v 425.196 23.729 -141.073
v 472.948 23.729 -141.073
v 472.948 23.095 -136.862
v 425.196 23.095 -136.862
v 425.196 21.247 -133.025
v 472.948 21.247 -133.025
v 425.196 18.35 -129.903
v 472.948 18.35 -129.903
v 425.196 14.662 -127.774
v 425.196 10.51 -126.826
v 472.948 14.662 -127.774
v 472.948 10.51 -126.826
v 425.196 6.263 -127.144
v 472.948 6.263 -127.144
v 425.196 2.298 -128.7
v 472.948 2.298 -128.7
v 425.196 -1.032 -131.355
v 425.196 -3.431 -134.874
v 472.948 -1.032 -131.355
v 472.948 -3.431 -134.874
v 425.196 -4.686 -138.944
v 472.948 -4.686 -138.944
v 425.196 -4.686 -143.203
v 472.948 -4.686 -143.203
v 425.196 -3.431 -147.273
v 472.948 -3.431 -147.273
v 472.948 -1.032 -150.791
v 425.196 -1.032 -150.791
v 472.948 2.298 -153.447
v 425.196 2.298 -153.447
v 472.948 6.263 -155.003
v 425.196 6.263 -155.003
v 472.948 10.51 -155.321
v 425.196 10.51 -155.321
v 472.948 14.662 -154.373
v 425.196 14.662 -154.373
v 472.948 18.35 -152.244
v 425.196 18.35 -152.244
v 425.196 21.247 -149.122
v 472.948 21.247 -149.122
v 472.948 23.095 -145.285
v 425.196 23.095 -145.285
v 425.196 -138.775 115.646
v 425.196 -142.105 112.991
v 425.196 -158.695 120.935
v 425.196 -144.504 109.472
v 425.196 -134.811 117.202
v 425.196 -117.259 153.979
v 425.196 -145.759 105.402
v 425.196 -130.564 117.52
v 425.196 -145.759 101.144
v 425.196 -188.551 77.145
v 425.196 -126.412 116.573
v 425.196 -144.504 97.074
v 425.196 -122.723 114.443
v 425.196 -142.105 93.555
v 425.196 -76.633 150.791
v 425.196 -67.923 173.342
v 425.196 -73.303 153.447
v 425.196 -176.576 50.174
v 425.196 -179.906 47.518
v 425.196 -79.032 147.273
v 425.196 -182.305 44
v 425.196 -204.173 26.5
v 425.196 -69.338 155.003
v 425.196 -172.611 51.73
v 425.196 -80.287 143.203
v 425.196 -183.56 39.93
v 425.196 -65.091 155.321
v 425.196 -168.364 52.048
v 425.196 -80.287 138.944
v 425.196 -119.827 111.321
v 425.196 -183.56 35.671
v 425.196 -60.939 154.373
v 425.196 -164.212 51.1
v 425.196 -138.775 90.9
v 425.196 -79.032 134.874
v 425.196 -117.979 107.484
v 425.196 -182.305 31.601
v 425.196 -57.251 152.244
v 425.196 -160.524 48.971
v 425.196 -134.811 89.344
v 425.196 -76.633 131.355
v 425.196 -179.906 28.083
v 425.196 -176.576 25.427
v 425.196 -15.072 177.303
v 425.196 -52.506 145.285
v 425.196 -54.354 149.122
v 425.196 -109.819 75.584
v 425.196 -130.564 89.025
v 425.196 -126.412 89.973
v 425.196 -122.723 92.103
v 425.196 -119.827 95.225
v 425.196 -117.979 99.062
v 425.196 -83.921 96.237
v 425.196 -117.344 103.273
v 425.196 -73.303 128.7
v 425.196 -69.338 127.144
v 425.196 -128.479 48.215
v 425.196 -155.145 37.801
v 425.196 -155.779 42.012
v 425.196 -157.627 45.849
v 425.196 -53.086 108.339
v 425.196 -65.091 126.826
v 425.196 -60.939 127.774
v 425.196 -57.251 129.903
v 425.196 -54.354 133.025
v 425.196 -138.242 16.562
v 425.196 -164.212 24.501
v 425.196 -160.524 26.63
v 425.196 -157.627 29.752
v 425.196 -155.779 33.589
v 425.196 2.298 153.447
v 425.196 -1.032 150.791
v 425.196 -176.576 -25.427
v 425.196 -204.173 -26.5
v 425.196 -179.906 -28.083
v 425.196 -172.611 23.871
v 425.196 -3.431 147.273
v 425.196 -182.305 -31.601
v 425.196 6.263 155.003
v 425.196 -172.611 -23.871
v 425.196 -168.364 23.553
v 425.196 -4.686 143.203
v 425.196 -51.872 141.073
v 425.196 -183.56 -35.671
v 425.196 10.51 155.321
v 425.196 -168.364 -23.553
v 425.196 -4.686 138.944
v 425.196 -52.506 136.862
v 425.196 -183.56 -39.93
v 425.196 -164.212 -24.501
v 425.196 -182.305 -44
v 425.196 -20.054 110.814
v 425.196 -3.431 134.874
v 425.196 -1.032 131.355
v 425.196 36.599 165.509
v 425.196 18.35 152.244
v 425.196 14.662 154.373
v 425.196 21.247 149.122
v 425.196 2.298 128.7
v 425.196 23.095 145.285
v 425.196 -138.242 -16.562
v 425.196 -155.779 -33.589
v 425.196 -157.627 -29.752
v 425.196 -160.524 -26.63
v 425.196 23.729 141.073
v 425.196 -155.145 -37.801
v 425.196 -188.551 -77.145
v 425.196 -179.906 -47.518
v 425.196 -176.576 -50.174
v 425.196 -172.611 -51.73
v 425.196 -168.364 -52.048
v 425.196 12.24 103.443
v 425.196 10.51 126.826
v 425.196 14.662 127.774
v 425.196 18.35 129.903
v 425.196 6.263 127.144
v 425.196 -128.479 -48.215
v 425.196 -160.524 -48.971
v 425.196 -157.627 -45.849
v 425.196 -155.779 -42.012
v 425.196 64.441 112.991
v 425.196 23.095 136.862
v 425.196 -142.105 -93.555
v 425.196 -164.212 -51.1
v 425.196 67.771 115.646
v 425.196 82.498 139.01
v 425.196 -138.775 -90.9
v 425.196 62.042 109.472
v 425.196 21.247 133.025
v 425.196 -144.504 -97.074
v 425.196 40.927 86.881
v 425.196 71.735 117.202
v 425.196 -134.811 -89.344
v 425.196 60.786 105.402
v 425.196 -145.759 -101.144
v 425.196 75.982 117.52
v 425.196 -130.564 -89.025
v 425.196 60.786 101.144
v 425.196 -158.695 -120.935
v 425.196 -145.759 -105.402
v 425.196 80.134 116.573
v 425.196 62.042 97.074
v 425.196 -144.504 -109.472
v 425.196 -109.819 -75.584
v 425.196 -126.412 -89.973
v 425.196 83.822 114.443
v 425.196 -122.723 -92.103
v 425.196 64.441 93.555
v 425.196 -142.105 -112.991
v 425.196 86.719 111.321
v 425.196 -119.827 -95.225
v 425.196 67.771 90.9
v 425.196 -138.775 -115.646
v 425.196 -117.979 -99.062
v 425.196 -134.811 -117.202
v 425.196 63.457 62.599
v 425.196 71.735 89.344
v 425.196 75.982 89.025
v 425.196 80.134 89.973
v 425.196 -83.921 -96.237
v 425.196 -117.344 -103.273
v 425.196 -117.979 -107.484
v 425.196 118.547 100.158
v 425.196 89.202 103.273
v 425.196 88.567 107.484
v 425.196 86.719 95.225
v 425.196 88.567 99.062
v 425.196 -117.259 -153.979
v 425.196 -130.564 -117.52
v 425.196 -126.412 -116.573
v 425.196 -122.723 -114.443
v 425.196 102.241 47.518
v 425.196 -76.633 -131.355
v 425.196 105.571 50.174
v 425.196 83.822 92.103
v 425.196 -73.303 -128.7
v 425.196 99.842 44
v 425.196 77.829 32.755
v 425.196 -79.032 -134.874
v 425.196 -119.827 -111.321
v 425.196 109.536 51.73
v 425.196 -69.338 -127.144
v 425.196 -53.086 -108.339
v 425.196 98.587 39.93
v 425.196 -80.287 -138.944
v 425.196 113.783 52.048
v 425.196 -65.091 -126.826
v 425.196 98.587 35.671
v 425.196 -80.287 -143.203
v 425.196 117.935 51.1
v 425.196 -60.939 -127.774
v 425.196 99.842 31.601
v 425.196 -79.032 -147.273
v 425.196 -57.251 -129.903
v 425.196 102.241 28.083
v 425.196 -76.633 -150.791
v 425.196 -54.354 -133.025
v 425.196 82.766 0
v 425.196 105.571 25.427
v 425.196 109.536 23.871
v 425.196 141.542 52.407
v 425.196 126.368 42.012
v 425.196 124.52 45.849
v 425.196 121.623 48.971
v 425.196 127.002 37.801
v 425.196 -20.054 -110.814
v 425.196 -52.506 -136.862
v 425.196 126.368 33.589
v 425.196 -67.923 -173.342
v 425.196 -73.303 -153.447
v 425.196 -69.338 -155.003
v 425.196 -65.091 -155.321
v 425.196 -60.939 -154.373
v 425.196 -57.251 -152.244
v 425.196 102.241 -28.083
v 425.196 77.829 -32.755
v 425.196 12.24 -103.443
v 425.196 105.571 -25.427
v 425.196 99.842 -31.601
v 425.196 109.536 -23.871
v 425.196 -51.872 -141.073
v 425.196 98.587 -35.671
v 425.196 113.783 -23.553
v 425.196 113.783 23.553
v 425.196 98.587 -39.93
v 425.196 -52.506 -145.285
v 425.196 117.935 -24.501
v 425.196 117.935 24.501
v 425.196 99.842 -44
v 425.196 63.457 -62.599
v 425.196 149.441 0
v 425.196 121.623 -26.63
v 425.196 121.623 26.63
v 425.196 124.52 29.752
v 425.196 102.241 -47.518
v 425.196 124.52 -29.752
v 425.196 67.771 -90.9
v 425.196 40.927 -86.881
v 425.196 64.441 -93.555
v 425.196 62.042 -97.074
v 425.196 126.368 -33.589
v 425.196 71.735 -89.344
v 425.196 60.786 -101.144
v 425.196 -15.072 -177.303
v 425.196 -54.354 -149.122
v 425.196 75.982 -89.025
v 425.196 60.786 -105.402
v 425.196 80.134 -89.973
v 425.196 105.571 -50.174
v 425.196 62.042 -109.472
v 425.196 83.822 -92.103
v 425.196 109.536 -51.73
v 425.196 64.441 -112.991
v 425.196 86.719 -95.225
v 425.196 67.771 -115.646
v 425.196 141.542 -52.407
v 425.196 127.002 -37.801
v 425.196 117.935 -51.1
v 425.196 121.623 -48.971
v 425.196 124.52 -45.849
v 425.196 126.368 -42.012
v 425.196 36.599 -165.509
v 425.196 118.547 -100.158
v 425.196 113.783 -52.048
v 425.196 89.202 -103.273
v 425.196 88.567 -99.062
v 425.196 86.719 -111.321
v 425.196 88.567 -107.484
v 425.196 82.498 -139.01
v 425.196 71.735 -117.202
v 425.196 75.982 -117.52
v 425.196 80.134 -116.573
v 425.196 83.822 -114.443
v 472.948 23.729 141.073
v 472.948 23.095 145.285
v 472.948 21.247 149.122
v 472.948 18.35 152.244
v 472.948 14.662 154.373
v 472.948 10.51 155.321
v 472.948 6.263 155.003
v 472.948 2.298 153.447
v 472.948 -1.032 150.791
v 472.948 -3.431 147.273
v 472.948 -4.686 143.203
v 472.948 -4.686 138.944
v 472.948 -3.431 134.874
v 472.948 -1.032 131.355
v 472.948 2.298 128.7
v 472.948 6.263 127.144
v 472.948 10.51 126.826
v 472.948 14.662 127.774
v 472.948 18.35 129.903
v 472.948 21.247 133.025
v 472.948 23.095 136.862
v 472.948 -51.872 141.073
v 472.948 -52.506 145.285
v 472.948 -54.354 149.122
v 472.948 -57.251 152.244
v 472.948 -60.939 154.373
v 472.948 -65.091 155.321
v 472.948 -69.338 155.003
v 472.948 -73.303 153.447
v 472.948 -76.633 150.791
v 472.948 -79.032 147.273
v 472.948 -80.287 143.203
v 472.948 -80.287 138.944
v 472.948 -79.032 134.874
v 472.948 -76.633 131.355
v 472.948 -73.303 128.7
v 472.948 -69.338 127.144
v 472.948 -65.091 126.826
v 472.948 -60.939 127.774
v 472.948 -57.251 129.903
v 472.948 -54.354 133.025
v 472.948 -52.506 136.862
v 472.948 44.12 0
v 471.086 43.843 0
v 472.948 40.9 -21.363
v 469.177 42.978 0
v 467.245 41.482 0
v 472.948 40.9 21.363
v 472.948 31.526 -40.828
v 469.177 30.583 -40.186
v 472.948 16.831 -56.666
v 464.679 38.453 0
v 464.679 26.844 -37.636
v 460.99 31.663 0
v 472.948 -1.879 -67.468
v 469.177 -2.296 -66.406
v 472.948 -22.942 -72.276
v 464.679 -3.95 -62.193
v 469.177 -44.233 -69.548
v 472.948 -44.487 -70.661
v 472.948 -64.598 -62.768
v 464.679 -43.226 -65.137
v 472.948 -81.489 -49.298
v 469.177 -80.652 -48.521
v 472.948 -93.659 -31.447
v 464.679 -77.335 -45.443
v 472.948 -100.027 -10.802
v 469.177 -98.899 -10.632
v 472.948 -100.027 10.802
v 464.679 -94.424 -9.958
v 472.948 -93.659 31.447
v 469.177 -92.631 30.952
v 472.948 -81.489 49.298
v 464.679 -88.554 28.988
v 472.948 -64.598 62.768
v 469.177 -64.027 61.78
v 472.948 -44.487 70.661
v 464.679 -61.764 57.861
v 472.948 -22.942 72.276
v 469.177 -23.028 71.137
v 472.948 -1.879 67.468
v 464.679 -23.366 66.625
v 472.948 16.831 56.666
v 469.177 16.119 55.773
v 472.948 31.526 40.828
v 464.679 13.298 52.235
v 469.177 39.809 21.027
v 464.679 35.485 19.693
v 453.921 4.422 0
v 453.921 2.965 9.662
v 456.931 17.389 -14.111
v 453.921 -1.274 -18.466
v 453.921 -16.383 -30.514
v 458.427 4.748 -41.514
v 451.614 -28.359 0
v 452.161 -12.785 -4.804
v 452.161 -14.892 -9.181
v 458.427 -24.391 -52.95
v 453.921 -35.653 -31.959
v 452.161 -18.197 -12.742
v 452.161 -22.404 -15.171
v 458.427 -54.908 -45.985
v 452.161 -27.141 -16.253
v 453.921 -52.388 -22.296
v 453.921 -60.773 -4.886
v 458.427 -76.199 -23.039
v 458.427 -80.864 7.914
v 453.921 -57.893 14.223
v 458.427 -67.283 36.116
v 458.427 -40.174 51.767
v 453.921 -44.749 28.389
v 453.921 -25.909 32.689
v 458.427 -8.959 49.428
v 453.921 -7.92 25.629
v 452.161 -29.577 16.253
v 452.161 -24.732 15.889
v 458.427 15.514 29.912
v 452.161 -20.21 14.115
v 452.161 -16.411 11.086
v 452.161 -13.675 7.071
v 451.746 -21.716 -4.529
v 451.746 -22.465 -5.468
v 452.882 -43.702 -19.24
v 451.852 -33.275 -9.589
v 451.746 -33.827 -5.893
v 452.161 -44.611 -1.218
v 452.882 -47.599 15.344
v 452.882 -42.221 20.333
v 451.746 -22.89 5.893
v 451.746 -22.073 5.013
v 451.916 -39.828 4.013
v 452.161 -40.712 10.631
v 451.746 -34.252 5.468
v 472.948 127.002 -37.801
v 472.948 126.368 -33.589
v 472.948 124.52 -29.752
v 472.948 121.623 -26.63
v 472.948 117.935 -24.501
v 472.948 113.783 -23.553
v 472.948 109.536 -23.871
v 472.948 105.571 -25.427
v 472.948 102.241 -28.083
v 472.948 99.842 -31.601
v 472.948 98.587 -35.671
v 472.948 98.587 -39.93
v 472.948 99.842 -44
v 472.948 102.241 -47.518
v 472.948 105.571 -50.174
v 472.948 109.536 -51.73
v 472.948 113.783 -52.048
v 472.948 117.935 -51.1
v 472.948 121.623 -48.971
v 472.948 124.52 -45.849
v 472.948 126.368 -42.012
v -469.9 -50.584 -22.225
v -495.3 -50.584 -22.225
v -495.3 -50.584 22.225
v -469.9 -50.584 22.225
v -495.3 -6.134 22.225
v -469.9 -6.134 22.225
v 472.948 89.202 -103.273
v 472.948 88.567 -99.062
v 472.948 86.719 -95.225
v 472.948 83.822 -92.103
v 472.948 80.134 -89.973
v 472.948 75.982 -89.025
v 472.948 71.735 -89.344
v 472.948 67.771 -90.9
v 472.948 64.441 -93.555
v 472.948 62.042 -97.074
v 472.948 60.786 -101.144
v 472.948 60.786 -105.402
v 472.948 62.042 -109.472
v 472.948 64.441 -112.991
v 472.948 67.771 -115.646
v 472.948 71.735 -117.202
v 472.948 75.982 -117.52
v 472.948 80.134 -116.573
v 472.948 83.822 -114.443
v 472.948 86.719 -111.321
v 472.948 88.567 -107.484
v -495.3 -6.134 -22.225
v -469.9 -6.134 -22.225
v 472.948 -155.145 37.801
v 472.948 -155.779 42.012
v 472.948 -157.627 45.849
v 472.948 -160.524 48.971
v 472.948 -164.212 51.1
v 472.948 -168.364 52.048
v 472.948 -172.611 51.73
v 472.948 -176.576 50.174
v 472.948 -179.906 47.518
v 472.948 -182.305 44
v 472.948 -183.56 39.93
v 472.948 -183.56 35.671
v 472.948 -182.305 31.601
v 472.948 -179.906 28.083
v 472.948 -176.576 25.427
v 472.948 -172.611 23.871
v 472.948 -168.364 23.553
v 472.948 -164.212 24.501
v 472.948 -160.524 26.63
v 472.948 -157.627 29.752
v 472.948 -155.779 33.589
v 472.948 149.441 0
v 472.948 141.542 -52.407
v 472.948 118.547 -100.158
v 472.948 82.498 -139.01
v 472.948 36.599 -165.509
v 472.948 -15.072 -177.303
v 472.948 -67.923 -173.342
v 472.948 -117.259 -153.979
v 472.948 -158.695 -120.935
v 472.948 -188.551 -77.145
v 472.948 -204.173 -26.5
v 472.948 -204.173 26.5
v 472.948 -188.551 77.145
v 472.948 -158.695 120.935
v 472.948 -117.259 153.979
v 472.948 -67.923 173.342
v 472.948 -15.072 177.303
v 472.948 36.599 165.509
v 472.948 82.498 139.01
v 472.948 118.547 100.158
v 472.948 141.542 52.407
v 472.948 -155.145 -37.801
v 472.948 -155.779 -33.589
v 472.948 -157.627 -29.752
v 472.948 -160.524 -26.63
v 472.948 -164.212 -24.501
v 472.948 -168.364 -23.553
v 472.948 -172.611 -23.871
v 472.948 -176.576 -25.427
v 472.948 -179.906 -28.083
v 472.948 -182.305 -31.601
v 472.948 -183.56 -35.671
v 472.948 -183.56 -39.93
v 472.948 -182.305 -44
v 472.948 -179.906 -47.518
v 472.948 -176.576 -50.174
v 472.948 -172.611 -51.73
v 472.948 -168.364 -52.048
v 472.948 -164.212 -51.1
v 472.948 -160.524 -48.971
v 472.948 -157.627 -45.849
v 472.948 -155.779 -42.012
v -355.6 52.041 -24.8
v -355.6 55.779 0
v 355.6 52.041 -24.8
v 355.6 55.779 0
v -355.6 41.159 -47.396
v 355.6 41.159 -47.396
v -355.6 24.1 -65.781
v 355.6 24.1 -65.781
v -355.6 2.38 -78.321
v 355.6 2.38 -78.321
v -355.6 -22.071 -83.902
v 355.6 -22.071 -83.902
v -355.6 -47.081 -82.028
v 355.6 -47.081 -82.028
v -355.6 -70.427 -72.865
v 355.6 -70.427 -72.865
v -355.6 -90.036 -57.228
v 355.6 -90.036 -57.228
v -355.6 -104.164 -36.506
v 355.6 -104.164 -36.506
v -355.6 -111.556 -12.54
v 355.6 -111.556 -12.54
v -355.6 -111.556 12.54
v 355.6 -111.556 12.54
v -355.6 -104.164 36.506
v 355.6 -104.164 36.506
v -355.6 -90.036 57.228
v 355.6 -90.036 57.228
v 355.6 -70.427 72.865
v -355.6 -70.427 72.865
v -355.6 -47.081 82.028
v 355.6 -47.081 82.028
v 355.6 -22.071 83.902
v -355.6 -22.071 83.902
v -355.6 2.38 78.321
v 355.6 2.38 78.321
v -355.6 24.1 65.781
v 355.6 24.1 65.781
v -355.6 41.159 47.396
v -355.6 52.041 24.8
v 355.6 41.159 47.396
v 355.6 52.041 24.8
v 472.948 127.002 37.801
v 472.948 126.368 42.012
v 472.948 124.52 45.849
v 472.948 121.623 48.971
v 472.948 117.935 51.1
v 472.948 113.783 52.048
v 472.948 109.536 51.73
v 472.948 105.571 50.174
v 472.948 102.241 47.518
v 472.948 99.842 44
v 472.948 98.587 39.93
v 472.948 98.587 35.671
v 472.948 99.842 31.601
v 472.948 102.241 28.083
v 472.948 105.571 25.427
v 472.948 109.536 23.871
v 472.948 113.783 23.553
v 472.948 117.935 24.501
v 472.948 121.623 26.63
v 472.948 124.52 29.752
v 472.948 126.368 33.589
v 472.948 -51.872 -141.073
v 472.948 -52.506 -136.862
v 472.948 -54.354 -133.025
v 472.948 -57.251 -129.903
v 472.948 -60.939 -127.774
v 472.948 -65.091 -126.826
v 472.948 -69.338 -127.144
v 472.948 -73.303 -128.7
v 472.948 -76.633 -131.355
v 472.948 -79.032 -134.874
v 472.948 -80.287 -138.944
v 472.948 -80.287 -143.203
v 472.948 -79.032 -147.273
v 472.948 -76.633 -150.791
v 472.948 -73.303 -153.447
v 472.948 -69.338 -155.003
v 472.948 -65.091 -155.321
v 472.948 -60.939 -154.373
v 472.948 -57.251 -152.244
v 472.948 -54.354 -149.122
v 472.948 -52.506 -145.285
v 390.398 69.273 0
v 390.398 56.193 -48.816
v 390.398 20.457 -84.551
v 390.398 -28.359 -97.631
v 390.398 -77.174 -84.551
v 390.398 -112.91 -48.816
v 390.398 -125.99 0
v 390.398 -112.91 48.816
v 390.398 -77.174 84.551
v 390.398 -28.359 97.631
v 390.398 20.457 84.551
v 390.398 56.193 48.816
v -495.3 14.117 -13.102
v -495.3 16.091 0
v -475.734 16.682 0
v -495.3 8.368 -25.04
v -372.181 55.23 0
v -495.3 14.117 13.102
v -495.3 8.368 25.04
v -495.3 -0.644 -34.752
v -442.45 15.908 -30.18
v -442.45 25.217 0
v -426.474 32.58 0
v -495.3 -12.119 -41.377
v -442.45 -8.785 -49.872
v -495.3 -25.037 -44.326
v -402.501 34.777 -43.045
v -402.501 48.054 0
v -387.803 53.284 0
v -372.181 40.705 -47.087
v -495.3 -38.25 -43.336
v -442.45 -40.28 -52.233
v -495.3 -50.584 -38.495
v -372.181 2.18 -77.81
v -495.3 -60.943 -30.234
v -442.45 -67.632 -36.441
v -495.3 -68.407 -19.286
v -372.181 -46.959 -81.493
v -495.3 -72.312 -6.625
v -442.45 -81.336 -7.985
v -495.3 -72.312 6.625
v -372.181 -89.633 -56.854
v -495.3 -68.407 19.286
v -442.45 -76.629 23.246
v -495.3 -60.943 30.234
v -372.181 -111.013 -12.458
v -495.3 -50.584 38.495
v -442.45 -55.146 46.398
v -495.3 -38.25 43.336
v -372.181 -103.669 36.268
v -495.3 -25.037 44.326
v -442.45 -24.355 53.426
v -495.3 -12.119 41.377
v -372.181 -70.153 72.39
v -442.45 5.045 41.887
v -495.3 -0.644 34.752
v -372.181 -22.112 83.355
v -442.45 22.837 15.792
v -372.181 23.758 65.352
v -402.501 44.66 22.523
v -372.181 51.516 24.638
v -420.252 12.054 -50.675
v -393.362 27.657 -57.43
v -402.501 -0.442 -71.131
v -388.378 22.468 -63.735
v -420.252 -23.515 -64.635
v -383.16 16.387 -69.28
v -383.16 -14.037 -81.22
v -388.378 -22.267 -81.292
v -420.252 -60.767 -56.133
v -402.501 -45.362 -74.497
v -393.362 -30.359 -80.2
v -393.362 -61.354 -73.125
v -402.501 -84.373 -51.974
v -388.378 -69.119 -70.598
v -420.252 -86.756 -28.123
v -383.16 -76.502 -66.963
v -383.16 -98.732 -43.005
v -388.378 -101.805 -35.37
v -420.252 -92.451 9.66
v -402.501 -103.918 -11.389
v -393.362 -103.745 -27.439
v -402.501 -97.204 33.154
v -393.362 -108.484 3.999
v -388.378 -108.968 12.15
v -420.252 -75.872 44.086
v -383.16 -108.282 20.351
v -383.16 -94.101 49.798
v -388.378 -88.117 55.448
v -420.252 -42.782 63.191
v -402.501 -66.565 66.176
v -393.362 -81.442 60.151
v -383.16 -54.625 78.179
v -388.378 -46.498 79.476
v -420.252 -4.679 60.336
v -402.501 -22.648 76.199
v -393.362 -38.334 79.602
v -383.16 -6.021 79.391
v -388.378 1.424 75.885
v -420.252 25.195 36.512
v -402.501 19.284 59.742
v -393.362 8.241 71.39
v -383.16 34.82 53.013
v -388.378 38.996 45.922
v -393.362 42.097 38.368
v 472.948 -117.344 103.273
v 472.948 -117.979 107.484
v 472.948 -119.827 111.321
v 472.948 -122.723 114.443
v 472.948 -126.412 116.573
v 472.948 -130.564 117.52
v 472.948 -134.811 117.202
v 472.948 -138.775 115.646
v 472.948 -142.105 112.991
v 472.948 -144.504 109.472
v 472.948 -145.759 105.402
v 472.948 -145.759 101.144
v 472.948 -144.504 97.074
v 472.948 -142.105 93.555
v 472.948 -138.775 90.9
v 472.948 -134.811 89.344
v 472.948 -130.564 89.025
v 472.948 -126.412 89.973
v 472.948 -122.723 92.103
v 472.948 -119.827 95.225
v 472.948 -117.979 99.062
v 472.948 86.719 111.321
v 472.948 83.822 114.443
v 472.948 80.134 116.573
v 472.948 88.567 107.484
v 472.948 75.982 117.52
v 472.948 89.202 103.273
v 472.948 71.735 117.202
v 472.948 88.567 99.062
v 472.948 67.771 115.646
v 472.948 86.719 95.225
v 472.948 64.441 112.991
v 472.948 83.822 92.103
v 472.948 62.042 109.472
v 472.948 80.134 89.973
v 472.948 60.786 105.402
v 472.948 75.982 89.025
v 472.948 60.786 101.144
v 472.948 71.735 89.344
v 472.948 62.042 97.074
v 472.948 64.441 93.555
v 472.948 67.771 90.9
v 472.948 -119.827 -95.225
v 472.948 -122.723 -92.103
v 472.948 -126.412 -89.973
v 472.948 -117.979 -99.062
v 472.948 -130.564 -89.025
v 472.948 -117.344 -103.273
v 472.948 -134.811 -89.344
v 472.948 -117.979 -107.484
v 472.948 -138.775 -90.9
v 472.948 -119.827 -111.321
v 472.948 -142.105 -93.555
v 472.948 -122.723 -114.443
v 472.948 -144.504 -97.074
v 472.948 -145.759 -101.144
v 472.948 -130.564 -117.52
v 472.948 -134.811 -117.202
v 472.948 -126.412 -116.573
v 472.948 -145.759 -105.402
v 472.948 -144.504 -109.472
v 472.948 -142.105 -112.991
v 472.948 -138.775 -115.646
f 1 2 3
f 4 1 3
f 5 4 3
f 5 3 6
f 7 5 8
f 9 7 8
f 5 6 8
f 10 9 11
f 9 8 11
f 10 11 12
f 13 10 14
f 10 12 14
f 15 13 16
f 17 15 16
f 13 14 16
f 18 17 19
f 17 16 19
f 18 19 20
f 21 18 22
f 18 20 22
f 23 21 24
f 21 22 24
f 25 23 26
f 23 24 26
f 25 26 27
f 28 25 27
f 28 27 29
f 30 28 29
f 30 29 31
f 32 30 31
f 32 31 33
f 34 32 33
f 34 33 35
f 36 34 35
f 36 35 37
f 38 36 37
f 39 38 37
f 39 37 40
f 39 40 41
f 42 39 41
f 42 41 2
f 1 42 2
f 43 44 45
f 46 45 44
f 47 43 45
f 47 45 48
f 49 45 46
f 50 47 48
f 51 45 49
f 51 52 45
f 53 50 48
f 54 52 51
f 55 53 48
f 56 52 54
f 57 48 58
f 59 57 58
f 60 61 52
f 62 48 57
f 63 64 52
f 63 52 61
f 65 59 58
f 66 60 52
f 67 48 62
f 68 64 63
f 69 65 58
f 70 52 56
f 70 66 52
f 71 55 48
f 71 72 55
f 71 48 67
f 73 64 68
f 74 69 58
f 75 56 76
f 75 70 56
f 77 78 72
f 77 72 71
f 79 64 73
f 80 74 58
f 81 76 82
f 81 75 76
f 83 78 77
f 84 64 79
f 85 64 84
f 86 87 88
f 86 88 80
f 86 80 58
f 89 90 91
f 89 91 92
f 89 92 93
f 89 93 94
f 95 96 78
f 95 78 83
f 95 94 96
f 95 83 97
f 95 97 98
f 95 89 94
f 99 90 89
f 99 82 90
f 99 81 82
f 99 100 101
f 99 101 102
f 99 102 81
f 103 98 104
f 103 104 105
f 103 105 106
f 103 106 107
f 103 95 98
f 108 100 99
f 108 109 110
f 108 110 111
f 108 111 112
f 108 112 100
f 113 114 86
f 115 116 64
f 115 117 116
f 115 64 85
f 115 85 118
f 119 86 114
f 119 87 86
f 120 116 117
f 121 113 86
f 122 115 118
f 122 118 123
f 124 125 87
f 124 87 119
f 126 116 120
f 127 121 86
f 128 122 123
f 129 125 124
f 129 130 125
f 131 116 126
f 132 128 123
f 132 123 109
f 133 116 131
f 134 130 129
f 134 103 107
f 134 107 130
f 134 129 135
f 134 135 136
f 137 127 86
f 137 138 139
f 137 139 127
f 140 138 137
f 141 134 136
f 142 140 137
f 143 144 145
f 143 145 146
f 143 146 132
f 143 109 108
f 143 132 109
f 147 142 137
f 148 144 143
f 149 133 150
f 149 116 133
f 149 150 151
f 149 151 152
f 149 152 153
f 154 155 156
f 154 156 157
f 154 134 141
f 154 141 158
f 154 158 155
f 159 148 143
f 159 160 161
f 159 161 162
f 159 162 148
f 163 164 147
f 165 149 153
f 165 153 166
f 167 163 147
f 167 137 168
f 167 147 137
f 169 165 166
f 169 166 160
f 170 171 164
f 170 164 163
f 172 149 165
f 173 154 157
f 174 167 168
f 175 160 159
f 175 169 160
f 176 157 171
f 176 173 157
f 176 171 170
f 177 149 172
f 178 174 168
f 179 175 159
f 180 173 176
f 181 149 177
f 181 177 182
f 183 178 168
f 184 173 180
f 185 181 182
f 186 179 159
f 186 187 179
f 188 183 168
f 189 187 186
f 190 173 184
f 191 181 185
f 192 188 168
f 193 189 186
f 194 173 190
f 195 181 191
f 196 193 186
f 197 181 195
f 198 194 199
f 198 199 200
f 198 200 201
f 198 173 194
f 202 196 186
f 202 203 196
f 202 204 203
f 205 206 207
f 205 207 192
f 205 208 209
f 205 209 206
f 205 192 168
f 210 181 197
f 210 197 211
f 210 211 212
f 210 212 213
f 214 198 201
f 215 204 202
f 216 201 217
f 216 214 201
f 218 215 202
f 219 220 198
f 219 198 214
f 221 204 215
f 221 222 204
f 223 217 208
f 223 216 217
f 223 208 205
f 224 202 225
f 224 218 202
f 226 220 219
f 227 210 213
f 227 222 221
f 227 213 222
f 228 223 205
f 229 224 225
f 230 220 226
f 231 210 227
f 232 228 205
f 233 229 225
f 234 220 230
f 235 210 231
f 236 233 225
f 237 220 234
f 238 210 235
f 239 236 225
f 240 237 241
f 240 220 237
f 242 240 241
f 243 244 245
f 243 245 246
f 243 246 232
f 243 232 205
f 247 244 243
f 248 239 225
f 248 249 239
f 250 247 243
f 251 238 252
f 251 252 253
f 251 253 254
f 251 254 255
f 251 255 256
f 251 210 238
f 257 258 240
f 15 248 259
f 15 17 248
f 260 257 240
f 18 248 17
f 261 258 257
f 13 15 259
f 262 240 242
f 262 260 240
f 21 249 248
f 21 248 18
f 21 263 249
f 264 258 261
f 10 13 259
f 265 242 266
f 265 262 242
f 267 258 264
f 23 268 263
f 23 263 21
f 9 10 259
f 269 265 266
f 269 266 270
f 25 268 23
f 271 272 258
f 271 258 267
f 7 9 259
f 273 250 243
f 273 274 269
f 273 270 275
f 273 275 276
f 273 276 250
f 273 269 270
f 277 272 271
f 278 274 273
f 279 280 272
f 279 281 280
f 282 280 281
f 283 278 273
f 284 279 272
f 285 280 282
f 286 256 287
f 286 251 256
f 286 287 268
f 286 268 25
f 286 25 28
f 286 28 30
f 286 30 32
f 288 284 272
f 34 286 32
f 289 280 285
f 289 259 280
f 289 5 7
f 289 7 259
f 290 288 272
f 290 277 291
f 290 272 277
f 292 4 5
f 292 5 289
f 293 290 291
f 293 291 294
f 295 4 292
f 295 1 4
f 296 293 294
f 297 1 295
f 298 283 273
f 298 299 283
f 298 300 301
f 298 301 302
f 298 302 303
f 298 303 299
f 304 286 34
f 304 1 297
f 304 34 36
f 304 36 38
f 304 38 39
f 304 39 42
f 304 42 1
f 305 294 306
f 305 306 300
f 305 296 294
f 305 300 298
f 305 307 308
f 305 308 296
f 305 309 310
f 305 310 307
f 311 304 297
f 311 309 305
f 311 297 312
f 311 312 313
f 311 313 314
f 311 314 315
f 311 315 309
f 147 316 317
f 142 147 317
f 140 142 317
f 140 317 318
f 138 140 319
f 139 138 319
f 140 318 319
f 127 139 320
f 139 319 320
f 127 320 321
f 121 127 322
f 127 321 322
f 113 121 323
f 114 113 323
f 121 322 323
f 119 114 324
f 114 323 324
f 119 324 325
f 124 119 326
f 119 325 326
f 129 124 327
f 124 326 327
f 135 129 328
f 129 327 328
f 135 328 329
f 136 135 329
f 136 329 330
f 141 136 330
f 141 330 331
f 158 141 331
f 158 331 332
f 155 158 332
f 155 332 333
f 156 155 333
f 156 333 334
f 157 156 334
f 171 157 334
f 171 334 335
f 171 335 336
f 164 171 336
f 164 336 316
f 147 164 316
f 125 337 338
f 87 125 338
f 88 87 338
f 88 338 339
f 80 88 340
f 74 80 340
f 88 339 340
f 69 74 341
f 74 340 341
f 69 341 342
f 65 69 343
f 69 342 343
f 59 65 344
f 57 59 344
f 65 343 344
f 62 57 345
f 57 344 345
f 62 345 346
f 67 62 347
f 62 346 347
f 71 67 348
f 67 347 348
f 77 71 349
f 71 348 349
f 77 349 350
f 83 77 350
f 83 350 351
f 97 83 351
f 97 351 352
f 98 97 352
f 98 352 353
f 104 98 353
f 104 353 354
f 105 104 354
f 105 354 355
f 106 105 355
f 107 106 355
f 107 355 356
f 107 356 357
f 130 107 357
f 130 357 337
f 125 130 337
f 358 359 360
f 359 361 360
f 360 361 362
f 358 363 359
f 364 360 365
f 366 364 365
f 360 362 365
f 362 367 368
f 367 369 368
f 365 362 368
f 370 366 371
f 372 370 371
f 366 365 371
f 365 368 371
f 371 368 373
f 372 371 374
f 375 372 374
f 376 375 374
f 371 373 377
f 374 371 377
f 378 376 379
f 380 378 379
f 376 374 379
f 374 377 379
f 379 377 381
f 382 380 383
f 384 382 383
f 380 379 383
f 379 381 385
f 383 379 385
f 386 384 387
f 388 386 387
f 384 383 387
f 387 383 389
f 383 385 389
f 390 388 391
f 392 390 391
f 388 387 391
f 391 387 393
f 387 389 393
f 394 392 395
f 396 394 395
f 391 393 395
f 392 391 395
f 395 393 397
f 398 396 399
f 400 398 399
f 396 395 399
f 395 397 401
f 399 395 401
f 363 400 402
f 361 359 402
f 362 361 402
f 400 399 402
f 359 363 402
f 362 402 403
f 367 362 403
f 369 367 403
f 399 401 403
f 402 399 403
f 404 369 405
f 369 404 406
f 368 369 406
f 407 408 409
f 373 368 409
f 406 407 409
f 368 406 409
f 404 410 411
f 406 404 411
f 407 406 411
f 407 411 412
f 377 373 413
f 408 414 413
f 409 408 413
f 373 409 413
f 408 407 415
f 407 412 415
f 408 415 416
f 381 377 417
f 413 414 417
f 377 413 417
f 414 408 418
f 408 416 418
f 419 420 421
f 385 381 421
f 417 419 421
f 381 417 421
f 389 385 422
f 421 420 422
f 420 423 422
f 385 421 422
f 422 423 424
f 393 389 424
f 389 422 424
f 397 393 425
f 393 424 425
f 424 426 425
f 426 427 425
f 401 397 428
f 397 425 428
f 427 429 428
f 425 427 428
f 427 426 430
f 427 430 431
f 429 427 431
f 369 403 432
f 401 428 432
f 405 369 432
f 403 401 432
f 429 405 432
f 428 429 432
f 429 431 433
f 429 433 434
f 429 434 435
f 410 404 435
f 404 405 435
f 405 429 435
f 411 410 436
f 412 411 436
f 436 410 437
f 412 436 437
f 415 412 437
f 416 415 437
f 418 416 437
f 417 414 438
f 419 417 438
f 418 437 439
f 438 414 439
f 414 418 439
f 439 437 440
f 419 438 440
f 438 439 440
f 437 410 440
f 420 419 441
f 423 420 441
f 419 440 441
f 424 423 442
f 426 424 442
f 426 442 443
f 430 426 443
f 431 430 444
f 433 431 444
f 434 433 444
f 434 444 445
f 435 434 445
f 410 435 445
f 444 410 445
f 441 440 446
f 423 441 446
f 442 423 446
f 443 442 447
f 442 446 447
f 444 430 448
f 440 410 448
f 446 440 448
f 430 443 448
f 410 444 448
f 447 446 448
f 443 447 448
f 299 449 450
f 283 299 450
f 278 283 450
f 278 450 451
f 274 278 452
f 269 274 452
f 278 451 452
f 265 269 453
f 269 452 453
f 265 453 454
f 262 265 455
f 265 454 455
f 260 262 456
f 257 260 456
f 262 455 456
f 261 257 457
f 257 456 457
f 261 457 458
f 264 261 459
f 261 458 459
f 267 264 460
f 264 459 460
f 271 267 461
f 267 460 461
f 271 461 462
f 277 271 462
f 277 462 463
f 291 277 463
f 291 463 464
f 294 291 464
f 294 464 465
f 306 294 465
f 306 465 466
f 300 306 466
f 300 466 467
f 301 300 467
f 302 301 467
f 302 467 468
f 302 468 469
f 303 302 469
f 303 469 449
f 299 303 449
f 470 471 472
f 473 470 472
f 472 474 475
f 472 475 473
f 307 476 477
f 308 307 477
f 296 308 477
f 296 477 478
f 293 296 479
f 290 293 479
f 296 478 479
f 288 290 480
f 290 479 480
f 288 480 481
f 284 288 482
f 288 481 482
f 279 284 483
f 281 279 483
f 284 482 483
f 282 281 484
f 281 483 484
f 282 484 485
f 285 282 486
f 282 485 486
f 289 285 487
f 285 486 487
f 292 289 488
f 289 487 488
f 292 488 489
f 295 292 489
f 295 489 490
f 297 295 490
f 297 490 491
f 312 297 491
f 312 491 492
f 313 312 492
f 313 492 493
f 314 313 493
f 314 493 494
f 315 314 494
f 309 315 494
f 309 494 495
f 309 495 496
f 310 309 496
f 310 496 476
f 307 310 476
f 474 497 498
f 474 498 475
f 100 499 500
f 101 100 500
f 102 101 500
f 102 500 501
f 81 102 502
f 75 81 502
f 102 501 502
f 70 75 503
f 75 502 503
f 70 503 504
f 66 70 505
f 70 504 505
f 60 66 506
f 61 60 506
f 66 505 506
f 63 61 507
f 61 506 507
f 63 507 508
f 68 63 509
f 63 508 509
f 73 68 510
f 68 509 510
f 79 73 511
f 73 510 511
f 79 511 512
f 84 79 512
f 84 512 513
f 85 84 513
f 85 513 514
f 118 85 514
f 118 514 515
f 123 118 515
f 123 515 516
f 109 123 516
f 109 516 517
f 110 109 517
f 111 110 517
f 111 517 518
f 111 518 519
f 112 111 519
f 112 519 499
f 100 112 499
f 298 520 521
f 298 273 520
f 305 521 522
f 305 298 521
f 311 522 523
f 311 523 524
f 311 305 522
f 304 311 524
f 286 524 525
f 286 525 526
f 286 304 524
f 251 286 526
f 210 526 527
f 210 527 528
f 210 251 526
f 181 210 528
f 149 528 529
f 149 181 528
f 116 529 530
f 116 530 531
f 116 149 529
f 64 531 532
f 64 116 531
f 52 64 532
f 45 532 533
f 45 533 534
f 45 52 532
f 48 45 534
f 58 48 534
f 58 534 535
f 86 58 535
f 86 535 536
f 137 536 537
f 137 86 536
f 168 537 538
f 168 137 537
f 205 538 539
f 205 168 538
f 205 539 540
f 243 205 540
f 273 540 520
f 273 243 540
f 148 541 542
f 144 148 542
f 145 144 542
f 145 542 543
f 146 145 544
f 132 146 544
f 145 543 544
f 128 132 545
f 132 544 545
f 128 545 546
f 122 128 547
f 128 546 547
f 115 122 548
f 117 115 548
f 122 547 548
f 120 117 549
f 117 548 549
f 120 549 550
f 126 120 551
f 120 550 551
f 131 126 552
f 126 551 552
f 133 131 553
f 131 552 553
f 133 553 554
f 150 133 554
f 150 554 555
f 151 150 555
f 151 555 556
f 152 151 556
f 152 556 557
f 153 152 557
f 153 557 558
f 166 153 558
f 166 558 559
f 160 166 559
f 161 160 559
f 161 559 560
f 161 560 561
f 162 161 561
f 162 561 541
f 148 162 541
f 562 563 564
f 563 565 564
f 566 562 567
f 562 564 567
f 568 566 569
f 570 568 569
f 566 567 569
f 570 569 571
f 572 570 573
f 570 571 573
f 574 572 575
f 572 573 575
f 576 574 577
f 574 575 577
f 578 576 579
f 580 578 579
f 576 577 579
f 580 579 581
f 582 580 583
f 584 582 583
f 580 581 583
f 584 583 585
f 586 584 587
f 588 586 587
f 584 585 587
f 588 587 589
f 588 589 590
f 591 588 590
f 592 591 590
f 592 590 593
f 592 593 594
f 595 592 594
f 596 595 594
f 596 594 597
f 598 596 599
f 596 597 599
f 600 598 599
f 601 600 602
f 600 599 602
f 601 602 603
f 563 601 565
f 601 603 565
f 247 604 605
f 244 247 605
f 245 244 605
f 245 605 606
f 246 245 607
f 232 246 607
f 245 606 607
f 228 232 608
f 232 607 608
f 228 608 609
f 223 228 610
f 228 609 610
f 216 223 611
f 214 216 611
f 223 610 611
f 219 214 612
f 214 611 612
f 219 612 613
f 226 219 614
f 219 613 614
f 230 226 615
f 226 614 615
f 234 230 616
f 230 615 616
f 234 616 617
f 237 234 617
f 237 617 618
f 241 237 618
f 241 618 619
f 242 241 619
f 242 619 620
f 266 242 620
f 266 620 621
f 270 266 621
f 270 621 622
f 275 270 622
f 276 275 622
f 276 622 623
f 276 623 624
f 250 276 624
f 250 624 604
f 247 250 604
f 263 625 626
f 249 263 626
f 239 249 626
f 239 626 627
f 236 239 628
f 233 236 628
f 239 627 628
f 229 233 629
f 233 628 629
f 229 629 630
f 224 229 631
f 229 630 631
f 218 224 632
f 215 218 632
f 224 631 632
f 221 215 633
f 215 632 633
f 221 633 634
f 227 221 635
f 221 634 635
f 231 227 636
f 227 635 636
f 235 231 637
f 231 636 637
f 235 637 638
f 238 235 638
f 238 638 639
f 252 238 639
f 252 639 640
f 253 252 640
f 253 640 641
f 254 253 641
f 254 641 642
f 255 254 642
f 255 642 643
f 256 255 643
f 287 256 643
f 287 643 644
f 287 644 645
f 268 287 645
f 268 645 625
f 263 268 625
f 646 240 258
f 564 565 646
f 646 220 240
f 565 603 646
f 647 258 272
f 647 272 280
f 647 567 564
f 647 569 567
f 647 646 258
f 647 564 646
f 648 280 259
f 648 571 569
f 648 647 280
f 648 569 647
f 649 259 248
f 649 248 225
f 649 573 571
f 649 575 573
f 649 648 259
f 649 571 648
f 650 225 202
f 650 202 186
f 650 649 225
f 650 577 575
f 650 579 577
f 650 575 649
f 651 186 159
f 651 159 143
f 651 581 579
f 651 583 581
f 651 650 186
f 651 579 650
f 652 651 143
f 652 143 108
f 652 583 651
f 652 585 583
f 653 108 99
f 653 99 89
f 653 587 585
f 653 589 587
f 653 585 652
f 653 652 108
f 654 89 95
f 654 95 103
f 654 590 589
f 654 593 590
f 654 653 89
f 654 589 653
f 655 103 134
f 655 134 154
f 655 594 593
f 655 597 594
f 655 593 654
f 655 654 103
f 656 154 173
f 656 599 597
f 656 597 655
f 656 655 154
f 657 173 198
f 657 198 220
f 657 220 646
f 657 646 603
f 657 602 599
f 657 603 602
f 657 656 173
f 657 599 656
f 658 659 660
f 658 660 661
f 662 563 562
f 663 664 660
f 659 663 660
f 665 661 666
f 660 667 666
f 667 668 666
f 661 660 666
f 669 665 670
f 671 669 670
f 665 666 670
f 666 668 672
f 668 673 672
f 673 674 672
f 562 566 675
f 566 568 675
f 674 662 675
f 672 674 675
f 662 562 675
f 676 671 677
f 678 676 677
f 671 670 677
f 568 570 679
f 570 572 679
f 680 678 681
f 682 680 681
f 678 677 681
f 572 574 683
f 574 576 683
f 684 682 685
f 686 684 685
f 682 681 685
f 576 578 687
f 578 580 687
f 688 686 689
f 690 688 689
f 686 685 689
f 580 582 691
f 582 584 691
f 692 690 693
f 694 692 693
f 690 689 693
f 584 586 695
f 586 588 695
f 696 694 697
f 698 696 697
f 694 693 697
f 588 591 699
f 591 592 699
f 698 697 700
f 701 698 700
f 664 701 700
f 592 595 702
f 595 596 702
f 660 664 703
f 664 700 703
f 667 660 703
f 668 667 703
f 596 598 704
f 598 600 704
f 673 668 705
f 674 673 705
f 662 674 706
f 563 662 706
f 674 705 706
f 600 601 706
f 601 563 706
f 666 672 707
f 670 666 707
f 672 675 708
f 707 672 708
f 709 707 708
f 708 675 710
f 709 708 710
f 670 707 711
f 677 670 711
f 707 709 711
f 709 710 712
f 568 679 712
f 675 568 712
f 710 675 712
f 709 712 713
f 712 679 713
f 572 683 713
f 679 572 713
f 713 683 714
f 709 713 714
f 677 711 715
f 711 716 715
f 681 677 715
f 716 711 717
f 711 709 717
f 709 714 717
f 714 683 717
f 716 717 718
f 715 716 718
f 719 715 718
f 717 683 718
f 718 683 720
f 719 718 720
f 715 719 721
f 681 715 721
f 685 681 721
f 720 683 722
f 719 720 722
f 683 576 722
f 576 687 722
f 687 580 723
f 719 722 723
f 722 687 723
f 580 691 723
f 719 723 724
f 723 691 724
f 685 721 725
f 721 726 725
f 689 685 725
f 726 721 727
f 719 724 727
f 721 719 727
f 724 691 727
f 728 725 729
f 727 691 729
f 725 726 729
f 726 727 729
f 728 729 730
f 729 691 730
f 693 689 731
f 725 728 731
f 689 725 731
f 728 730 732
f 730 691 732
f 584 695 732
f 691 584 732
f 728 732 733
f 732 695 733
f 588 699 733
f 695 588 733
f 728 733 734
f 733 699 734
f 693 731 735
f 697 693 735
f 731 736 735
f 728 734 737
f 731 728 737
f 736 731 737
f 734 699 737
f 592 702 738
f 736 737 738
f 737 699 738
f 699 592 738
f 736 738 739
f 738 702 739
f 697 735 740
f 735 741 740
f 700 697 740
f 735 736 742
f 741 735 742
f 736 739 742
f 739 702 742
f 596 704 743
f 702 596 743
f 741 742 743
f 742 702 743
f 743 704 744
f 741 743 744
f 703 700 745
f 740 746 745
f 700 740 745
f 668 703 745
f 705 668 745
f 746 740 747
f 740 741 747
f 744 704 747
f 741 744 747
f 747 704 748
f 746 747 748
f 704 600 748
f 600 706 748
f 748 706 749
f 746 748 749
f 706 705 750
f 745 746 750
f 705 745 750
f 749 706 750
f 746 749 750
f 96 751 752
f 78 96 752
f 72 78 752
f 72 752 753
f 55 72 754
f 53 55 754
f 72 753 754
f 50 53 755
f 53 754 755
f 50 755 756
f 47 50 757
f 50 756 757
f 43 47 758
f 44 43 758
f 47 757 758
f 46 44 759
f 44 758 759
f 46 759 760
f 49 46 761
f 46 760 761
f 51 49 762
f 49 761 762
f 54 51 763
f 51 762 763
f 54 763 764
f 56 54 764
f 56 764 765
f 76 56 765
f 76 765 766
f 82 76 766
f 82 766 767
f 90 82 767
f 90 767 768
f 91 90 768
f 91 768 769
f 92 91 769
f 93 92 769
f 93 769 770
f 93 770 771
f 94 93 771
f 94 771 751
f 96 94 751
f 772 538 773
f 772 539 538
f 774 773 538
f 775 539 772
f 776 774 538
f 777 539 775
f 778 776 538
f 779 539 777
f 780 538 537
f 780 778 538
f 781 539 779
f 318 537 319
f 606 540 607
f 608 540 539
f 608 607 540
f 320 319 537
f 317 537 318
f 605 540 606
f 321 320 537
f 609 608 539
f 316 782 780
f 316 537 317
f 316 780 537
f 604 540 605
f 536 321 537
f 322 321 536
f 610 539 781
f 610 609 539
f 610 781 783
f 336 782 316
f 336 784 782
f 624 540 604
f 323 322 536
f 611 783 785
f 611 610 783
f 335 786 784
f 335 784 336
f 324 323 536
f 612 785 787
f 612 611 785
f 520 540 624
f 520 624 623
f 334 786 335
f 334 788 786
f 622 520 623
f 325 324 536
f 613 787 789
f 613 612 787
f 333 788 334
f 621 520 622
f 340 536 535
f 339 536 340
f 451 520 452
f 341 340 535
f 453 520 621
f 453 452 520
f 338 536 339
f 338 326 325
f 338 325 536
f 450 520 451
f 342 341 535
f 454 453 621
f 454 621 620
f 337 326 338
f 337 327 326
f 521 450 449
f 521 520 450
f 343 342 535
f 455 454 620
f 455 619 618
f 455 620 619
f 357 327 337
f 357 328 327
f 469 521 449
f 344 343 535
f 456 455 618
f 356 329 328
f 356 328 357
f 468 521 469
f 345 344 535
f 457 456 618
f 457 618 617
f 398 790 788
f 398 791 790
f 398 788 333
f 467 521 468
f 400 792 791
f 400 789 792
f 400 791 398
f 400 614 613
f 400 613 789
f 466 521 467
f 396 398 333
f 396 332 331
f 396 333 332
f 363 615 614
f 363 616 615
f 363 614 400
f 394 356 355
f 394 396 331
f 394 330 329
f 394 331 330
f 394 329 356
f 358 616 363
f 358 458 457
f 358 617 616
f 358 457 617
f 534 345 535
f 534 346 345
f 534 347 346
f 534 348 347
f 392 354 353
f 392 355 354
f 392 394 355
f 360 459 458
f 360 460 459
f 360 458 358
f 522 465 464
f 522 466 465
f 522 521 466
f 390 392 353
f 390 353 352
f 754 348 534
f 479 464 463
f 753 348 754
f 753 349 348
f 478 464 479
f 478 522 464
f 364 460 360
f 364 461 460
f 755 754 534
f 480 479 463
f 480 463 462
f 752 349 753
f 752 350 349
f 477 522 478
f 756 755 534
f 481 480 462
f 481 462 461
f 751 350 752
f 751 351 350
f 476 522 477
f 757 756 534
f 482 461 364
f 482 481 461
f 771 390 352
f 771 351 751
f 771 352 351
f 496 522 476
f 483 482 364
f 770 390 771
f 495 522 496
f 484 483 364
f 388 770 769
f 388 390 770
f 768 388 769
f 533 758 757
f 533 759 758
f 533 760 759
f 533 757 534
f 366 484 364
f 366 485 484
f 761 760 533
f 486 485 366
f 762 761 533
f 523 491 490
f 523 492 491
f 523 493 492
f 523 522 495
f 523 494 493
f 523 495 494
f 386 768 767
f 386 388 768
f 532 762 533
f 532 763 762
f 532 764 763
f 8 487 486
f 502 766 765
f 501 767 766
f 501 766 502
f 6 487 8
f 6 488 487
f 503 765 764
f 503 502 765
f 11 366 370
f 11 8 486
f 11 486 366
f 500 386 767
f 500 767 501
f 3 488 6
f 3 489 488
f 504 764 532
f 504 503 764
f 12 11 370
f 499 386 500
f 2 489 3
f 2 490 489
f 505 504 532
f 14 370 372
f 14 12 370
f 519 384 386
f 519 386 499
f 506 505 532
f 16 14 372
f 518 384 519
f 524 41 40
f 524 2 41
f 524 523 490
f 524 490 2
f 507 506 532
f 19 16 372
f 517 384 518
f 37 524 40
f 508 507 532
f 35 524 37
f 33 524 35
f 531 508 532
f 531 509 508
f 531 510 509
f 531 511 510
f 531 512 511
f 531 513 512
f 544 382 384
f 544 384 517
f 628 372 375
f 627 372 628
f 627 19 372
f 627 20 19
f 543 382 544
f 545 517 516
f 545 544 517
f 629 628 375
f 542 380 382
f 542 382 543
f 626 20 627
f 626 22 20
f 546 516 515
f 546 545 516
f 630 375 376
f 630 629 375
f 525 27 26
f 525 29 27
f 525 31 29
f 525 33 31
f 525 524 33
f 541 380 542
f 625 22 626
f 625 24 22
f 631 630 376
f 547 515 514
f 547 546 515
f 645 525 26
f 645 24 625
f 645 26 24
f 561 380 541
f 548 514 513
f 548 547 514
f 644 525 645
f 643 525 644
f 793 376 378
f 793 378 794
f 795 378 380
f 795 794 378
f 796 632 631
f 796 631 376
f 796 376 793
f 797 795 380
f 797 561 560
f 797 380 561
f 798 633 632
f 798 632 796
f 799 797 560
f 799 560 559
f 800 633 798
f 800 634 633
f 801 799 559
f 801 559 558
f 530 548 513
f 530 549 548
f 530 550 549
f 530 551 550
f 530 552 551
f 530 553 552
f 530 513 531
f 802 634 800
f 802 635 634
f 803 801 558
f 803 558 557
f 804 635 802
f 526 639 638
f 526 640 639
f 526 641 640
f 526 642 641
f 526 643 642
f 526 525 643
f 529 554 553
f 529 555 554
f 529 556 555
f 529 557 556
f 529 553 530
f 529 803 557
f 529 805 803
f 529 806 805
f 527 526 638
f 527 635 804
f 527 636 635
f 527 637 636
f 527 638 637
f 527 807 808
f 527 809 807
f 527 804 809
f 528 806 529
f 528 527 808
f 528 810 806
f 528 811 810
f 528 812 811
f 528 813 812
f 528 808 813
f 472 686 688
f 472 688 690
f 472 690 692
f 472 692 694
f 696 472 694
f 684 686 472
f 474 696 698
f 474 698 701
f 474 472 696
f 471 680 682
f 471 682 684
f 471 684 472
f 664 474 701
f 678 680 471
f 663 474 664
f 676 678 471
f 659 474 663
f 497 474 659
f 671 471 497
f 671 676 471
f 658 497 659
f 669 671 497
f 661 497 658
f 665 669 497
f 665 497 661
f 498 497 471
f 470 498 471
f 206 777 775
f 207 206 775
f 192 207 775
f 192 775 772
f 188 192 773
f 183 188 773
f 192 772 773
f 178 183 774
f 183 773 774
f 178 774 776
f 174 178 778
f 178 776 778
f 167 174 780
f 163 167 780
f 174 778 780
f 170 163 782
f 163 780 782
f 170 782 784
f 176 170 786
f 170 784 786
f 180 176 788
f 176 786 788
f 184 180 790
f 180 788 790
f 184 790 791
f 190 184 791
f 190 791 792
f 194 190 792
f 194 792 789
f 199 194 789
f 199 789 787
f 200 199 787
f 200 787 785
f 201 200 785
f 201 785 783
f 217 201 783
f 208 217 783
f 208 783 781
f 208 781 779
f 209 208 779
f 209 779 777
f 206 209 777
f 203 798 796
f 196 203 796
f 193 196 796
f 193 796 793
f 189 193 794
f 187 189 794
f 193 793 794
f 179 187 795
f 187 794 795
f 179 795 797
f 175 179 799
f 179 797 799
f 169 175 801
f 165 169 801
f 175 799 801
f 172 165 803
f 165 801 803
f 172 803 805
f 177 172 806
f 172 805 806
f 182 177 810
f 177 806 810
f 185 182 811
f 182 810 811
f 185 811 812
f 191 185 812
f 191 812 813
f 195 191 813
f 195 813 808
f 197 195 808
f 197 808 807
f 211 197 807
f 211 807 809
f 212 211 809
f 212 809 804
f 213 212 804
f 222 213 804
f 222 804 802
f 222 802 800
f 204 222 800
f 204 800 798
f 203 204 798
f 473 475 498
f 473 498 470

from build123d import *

# Parameters (mm, degrees)
F0_W     = 711.2
F0_H     = 84.1375
F2_W     = 44.45
F2_H     = 44.45
F3_DEPTH = 25.4
F4_R     = 14.2875
F5_DEPTH = 968.2490001


with BuildPart() as f1:
    # F0 (on Top) → F1 (revolve)
    with BuildSketch(Plane.XY):
        with BuildLine():
            Line((-355.6, -28.3585746473), (-355.6, 55.7789253527))
            add(Edge.make_bspline(
                [(-495.3, 16.0914253527), (-491.1825215885, 15.7318338139), (-479.4418370711, 14.7064851925), (-427.3573599541, 26.8287985997), (-400.0577825465, 54.9384491614), (-370.6219245107, 55.4949352575), (-355.6, 55.7789253527)],
                knots=[0, 0, 0, 0, 0.1628231526, 0.4642781518, 0.7266064691, 1, 1, 1, 1], degree=3))
            Line((-495.3, 16.0914253527), (-495.3, -28.3585746473))
            Line((-495.3, -28.3585746473), (-355.6, -28.3585746473))
        make_face()
        with Locations((0, 13.7101753527)):
            Rectangle(F0_W, F0_H)
        with BuildLine():
            Line((425.196, 82.7664253527), (355.6, 55.7789253527))
            Line((355.6, 55.7789253527), (355.6, -28.3585746473))
            Line((355.6, -28.3585746473), (451.6144843253, -28.3585746473))
            add(Edge.make_bspline(
                [(472.948, 44.1196709871), (451.6144843253, 44.1196709871), (451.6144843253, -28.3585746473)],
                knots=[0, 0, 0, 1.5707963268, 1.5707963268, 1.5707963268], degree=2, weights=[1, 0.7071067812, 1]))
            Line((472.948, 44.1196709871), (472.948, 149.4414253527))
            Line((472.948, 149.4414253527), (425.196, 149.4414253527))
            Line((425.196, 149.4414253527), (425.196, 82.7664253527))
        make_face()
    revolve(axis=Axis((-425.45, -28.3585746473, 0), (-1, 0, 0)))

    # F2 (on face) → F3 (cut)
    with BuildSketch(Plane(origin=(-495.3, 0, 0), x_dir=(0, -1, 0), z_dir=(-1, 0, 0))):
        with Locations((28.3585746473, 0)):
            Rectangle(F2_W, F2_H)
    extrude(amount=-F3_DEPTH, mode=Mode.SUBTRACT)

    # F4 (on face) → F5 (cut, through all)
    with BuildSketch(Plane.YZ.offset(472.948)):
        with Locations((-131.6315200396, 103.2729453923)):
            Circle(F4_R)
        with Locations((-66.1590961845, 141.0734669295)):
            Circle(F4_R)
        with Locations((9.4419468899, 141.0734669295)):
            Circle(F4_R)
        with Locations((74.914370745, 103.2729453923)):
            Circle(F4_R)
        with Locations((112.7148922822, 37.8005215372)):
            Circle(F4_R)
        with Locations((112.7148922822, -37.8005215372)):
            Circle(F4_R)
        with Locations((74.914370745, -103.2729453923)):
            Circle(F4_R)
        with Locations((9.4419468899, -141.0734669295)):
            Circle(F4_R)
        with Locations((-66.1590961845, -141.0734669295)):
            Circle(F4_R)
        with Locations((-131.6315200396, -103.2729453923)):
            Circle(F4_R)
        with Locations((-169.4320415768, -37.8005215372)):
            Circle(F4_R)
        with Locations((-169.4320415768, 37.8005215372)):
            Circle(F4_R)
    extrude(amount=-F5_DEPTH, mode=Mode.SUBTRACT)


solid = f1.part
